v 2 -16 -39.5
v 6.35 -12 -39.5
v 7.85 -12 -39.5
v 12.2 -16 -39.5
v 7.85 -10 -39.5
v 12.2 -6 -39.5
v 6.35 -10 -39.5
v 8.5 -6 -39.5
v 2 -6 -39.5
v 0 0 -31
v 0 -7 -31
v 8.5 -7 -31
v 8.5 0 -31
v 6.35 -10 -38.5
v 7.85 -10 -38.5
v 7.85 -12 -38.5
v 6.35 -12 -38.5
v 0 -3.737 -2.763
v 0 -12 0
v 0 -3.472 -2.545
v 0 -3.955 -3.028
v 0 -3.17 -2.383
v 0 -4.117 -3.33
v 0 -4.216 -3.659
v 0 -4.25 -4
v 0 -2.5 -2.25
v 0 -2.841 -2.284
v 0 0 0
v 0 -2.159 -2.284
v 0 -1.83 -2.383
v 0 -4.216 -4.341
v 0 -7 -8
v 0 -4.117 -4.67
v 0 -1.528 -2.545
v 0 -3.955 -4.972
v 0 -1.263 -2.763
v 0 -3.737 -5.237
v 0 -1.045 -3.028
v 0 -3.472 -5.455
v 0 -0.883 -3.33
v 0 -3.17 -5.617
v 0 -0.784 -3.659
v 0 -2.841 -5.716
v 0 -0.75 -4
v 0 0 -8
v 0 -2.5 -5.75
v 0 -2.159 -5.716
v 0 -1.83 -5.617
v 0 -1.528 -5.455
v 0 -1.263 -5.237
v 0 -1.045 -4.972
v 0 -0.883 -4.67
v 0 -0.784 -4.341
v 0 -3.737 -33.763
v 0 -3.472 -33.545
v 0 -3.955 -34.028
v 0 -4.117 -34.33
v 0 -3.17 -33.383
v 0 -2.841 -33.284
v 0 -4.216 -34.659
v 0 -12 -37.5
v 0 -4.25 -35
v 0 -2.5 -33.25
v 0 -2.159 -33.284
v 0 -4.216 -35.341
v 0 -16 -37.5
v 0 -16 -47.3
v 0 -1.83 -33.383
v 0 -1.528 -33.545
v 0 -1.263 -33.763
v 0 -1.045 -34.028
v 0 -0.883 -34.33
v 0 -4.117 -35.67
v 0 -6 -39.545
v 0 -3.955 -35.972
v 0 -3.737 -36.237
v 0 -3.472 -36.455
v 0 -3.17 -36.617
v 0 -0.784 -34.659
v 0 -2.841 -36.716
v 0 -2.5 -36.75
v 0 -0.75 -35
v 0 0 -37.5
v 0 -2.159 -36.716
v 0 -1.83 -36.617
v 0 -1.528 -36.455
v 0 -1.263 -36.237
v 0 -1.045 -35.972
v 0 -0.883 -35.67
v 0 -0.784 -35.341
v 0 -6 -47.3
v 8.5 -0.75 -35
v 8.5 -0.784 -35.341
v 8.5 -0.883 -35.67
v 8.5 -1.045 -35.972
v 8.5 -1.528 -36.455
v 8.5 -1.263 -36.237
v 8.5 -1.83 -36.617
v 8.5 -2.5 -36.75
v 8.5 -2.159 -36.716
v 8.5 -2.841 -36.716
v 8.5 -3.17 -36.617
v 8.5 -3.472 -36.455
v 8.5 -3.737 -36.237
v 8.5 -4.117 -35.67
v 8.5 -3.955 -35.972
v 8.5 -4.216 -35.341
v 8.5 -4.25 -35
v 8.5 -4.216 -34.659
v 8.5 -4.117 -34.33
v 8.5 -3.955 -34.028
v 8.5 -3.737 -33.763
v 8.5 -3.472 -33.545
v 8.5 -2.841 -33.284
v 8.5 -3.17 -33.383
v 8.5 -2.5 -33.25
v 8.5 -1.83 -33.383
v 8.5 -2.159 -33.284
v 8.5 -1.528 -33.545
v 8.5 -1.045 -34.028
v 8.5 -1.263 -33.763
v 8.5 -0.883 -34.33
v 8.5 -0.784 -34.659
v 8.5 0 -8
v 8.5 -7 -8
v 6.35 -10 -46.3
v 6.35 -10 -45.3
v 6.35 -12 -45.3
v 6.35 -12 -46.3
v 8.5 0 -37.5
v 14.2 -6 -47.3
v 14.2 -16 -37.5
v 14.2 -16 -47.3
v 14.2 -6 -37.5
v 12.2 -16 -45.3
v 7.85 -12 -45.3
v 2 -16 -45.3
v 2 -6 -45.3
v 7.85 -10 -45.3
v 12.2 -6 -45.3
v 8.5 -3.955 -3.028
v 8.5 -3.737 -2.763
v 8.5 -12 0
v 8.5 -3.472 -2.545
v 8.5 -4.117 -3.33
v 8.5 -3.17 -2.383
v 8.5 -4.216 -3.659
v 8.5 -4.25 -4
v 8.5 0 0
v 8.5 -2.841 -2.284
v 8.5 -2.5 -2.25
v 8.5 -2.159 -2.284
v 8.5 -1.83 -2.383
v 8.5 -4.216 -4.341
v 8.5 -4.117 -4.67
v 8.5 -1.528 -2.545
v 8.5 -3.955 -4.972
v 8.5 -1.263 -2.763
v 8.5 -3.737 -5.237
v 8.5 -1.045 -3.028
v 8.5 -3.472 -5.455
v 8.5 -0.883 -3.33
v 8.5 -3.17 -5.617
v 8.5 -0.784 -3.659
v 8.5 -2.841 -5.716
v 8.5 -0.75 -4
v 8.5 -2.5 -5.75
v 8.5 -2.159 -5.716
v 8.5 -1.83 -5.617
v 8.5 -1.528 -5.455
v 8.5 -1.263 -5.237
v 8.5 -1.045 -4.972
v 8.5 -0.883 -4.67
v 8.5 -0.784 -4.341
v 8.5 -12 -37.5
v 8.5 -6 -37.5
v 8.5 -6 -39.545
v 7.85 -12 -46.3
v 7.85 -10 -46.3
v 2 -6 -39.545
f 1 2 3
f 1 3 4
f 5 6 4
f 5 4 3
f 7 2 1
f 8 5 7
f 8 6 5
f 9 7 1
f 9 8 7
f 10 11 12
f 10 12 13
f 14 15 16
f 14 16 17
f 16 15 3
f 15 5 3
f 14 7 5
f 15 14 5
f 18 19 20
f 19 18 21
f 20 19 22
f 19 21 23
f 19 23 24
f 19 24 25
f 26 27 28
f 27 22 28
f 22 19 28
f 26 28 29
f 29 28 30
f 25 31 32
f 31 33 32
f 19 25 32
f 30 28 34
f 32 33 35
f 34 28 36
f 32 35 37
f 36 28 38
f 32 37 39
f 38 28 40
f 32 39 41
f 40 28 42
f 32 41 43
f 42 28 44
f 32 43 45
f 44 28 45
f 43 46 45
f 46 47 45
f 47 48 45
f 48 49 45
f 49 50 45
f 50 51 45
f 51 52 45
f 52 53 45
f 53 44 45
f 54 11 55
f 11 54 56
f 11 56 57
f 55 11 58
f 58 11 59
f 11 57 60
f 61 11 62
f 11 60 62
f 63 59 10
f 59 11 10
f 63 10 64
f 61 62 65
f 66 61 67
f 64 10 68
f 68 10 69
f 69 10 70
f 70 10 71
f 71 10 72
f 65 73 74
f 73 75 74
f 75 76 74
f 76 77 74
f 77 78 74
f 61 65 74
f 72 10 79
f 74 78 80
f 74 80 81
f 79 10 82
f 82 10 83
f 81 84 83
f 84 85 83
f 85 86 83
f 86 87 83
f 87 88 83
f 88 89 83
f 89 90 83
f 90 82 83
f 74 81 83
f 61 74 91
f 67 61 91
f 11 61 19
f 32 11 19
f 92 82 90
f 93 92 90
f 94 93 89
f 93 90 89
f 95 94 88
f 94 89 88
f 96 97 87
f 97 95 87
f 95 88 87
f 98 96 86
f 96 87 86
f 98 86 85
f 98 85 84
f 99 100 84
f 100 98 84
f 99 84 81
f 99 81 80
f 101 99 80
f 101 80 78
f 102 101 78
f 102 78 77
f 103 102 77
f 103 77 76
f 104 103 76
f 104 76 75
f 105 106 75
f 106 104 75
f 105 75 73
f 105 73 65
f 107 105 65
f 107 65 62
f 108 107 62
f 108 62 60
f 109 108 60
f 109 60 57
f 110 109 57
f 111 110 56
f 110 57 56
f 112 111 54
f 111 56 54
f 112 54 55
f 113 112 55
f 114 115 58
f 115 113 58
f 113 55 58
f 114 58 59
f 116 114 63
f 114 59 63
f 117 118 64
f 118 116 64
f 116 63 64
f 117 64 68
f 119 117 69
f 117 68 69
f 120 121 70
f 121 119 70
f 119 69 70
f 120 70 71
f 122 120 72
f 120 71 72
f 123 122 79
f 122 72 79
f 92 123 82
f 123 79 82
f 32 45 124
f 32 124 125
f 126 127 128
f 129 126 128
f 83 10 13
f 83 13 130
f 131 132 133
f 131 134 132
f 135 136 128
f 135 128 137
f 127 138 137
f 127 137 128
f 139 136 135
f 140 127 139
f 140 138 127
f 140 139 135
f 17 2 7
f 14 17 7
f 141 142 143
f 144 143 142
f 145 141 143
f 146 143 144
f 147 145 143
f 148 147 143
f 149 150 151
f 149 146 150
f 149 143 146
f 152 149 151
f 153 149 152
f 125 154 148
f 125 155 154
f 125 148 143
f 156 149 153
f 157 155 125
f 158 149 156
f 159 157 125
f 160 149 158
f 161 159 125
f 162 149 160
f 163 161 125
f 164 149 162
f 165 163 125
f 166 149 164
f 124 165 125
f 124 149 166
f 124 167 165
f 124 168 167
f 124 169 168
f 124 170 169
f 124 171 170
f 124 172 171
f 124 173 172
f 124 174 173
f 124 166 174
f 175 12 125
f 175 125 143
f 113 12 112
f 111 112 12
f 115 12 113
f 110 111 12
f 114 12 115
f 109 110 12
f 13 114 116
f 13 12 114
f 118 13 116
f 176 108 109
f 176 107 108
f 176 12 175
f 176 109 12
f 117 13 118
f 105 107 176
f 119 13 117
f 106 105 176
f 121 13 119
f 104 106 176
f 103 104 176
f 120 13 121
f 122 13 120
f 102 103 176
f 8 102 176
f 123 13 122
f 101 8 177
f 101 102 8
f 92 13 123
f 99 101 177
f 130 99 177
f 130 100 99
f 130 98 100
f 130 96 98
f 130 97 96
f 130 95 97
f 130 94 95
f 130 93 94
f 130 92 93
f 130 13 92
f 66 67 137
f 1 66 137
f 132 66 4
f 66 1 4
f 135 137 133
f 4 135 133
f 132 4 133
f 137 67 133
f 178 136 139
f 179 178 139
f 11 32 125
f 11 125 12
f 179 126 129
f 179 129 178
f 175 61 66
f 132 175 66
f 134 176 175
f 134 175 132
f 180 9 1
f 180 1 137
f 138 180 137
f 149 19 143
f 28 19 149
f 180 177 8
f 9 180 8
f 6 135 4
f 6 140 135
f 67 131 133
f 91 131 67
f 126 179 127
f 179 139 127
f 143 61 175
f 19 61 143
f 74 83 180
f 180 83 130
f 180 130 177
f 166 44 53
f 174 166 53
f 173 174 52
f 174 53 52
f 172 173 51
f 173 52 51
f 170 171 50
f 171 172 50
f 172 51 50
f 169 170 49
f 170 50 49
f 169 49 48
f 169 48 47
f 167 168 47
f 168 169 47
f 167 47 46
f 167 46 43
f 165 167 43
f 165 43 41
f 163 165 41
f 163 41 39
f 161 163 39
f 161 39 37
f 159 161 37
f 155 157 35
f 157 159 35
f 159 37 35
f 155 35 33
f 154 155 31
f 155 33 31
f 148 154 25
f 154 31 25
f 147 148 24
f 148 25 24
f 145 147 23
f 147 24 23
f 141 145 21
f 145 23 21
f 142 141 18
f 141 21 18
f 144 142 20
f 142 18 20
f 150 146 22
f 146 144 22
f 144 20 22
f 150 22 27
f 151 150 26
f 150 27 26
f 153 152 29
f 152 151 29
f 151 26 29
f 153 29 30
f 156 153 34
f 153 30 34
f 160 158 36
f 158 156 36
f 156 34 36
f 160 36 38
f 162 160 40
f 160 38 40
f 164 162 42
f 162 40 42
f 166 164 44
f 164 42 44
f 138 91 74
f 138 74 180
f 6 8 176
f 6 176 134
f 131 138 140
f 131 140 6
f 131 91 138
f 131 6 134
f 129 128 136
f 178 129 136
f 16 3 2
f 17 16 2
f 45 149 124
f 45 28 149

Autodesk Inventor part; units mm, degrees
ref_plane "YZ Plane" through (0, 0, 0) normal (1, 0, 0) x (0, 1, 0)
ref_plane "XZ Plane" through (0, 0, 0) normal (0, 1, 0) x (-1, 0, 0)
ref_plane "XY Plane" through (0, 0, 0) normal (0, 0, 1) x (1, 0, 0)
sketch "Sketch1" plane through (0, 0, 0) normal (1, 0, 0) x (0, 1, 0)
  line L0 (0, 0) -> (0, -8)
  line L1 (0, -8) -> (-7, -8)
  line L2 (-7, -8) -> (-7, -31)
  line L3 (-7, -31) -> (0, -31)
  line L4 (0, -31) -> (0, -37.5)
  line L5 (0, -37.5) -> (-12, -37.5)
  line L6 (-12, -37.5) -> (-12, 0)
  line L7 (-12, 0) -> (0, 0)
  line L8 (0, -4) -> (-2.5, -4) construction
  circle A0 centre (-2.5, -4) radius 1.75
  line L9 (0, -31) -> (-2.5, -31) construction
  line L10 (-2.5, -31) -> (-2.5, -35) construction
  circle A1 centre (-2.5, -35) radius 1.75
  dimension "d0" = 8
  dimension "d1" = 7
  dimension "d2" = 23
  dimension "d3" = 6.5
  dimension "d4" = 12
  dimension "d5" = 2.5
  dimension "d6" = 3.5
  dimension "d7" = 4
  dimension "d8" = 3.5
extrude "Extrusion1" add sketch "Sketch1" along normal blind 8.5
sketch "Sketch2" plane through (0, 0, -31) normal (0, 1, 0) x (1, 0, 0)
  line L0 (0, 6.5) -> (0, -31) projected
  line L1 (0, 6.5) -> (2, 6.5) construction
  line L2 (0, 6.5) -> (8.5, 6.5) construction
  line L3 (2, 6.5) -> (0, 6.5) construction
  line L4 (0, 16.3) -> (2, 16.3) construction
  line L5 (2, 16.3) -> (2, 14.3) construction
  line L6 (2, 14.3) -> (12.2, 14.3)
  line L7 (12.2, 14.3) -> (12.2, 8.5)
  line L8 (12.2, 8.5) -> (2, 8.5)
  line L9 (2, 8.5) -> (2, 14.3)
  line L10 (0, 6.5) -> (14.2, 6.5)
  line L11 (14.2, 6.5) -> (14.2, 16.3)
  line L12 (14.2, 16.3) -> (0, 16.3)
  line L13 (0, 16.3) -> (0, 6.5)
  dimension "d11" = 9.8
  dimension "d15" = 2
  dimension "d16" = 2
  dimension "d17" = 10.2
  dimension "d18" = 5.8
  dimension "d19" = 14.2
extrude "Extrusion2" add sketch "Sketch2" against normal blind 16
extrude "Extrusion3" cut sketch "Sketch2" against normal blind 6
sketch "Sketch3" plane through (8.5, 0, 0) normal (1, 0, 0) x (0, 0, -1)
  line L0 (37.5, 0) -> (31, 0) projected
  line L1 (37.5, 0) -> (39.5451, -6)
  line L2 (37.5, -12) -> (37.5, -6) projected
  line L3 (39.5451, -6) -> (37.5, -6)
  line L4 (37.5, -6) -> (37.5, 0)
  point P0 (0, 0)
extrude "Extrusion4" add sketch "Sketch3" against normal blind 8.5
sketch "Sketch4" plane through (2, -16, -45.3) normal (0, 0, 1) x (1, 0, 0)
  line L0 (10.2, 0) -> (0, 0) construction
  line L1 (5.1, 0) -> (5.1, 4) construction
  line L2 (10.2, 10) -> (0, 10) construction
  line L3 (5.1, 4) -> (4.35, 4) construction
  line L4 (4.35, 4) -> (5.85, 4)
  line L5 (5.85, 4) -> (5.85, 6)
  line L6 (5.85, 6) -> (4.35, 6)
  line L7 (4.35, 6) -> (4.35, 4)
  point P0 (-2, 16)
  dimension "d28" = 1.5
  dimension "d29" = 2
extrude "Extrusion5" cut sketch "Sketch4" against normal blind 1
sketch "Sketch5" plane through (12.2, -16, -39.5) normal (0, 0, -1) x (-1, 0, 0)
  line L0 (10.2, 0) -> (0, 0) construction
  line L1 (5.1, 0) -> (5.1, 4) construction
  line L2 (5.1, 4) -> (4.35, 4) construction
  line L3 (4.35, 4) -> (5.85, 4)
  line L4 (5.85, 4) -> (5.85, 6)
  line L5 (5.85, 6) -> (4.35, 6)
  line L6 (4.35, 6) -> (4.35, 4)
  point P0 (12.2, 16)
  dimension "d34" = 1.5
  dimension "d35" = 2
extrude "Extrusion6" cut sketch "Sketch5" against normal blind 1
properties part number "Proximity Sensor Mount_1"
